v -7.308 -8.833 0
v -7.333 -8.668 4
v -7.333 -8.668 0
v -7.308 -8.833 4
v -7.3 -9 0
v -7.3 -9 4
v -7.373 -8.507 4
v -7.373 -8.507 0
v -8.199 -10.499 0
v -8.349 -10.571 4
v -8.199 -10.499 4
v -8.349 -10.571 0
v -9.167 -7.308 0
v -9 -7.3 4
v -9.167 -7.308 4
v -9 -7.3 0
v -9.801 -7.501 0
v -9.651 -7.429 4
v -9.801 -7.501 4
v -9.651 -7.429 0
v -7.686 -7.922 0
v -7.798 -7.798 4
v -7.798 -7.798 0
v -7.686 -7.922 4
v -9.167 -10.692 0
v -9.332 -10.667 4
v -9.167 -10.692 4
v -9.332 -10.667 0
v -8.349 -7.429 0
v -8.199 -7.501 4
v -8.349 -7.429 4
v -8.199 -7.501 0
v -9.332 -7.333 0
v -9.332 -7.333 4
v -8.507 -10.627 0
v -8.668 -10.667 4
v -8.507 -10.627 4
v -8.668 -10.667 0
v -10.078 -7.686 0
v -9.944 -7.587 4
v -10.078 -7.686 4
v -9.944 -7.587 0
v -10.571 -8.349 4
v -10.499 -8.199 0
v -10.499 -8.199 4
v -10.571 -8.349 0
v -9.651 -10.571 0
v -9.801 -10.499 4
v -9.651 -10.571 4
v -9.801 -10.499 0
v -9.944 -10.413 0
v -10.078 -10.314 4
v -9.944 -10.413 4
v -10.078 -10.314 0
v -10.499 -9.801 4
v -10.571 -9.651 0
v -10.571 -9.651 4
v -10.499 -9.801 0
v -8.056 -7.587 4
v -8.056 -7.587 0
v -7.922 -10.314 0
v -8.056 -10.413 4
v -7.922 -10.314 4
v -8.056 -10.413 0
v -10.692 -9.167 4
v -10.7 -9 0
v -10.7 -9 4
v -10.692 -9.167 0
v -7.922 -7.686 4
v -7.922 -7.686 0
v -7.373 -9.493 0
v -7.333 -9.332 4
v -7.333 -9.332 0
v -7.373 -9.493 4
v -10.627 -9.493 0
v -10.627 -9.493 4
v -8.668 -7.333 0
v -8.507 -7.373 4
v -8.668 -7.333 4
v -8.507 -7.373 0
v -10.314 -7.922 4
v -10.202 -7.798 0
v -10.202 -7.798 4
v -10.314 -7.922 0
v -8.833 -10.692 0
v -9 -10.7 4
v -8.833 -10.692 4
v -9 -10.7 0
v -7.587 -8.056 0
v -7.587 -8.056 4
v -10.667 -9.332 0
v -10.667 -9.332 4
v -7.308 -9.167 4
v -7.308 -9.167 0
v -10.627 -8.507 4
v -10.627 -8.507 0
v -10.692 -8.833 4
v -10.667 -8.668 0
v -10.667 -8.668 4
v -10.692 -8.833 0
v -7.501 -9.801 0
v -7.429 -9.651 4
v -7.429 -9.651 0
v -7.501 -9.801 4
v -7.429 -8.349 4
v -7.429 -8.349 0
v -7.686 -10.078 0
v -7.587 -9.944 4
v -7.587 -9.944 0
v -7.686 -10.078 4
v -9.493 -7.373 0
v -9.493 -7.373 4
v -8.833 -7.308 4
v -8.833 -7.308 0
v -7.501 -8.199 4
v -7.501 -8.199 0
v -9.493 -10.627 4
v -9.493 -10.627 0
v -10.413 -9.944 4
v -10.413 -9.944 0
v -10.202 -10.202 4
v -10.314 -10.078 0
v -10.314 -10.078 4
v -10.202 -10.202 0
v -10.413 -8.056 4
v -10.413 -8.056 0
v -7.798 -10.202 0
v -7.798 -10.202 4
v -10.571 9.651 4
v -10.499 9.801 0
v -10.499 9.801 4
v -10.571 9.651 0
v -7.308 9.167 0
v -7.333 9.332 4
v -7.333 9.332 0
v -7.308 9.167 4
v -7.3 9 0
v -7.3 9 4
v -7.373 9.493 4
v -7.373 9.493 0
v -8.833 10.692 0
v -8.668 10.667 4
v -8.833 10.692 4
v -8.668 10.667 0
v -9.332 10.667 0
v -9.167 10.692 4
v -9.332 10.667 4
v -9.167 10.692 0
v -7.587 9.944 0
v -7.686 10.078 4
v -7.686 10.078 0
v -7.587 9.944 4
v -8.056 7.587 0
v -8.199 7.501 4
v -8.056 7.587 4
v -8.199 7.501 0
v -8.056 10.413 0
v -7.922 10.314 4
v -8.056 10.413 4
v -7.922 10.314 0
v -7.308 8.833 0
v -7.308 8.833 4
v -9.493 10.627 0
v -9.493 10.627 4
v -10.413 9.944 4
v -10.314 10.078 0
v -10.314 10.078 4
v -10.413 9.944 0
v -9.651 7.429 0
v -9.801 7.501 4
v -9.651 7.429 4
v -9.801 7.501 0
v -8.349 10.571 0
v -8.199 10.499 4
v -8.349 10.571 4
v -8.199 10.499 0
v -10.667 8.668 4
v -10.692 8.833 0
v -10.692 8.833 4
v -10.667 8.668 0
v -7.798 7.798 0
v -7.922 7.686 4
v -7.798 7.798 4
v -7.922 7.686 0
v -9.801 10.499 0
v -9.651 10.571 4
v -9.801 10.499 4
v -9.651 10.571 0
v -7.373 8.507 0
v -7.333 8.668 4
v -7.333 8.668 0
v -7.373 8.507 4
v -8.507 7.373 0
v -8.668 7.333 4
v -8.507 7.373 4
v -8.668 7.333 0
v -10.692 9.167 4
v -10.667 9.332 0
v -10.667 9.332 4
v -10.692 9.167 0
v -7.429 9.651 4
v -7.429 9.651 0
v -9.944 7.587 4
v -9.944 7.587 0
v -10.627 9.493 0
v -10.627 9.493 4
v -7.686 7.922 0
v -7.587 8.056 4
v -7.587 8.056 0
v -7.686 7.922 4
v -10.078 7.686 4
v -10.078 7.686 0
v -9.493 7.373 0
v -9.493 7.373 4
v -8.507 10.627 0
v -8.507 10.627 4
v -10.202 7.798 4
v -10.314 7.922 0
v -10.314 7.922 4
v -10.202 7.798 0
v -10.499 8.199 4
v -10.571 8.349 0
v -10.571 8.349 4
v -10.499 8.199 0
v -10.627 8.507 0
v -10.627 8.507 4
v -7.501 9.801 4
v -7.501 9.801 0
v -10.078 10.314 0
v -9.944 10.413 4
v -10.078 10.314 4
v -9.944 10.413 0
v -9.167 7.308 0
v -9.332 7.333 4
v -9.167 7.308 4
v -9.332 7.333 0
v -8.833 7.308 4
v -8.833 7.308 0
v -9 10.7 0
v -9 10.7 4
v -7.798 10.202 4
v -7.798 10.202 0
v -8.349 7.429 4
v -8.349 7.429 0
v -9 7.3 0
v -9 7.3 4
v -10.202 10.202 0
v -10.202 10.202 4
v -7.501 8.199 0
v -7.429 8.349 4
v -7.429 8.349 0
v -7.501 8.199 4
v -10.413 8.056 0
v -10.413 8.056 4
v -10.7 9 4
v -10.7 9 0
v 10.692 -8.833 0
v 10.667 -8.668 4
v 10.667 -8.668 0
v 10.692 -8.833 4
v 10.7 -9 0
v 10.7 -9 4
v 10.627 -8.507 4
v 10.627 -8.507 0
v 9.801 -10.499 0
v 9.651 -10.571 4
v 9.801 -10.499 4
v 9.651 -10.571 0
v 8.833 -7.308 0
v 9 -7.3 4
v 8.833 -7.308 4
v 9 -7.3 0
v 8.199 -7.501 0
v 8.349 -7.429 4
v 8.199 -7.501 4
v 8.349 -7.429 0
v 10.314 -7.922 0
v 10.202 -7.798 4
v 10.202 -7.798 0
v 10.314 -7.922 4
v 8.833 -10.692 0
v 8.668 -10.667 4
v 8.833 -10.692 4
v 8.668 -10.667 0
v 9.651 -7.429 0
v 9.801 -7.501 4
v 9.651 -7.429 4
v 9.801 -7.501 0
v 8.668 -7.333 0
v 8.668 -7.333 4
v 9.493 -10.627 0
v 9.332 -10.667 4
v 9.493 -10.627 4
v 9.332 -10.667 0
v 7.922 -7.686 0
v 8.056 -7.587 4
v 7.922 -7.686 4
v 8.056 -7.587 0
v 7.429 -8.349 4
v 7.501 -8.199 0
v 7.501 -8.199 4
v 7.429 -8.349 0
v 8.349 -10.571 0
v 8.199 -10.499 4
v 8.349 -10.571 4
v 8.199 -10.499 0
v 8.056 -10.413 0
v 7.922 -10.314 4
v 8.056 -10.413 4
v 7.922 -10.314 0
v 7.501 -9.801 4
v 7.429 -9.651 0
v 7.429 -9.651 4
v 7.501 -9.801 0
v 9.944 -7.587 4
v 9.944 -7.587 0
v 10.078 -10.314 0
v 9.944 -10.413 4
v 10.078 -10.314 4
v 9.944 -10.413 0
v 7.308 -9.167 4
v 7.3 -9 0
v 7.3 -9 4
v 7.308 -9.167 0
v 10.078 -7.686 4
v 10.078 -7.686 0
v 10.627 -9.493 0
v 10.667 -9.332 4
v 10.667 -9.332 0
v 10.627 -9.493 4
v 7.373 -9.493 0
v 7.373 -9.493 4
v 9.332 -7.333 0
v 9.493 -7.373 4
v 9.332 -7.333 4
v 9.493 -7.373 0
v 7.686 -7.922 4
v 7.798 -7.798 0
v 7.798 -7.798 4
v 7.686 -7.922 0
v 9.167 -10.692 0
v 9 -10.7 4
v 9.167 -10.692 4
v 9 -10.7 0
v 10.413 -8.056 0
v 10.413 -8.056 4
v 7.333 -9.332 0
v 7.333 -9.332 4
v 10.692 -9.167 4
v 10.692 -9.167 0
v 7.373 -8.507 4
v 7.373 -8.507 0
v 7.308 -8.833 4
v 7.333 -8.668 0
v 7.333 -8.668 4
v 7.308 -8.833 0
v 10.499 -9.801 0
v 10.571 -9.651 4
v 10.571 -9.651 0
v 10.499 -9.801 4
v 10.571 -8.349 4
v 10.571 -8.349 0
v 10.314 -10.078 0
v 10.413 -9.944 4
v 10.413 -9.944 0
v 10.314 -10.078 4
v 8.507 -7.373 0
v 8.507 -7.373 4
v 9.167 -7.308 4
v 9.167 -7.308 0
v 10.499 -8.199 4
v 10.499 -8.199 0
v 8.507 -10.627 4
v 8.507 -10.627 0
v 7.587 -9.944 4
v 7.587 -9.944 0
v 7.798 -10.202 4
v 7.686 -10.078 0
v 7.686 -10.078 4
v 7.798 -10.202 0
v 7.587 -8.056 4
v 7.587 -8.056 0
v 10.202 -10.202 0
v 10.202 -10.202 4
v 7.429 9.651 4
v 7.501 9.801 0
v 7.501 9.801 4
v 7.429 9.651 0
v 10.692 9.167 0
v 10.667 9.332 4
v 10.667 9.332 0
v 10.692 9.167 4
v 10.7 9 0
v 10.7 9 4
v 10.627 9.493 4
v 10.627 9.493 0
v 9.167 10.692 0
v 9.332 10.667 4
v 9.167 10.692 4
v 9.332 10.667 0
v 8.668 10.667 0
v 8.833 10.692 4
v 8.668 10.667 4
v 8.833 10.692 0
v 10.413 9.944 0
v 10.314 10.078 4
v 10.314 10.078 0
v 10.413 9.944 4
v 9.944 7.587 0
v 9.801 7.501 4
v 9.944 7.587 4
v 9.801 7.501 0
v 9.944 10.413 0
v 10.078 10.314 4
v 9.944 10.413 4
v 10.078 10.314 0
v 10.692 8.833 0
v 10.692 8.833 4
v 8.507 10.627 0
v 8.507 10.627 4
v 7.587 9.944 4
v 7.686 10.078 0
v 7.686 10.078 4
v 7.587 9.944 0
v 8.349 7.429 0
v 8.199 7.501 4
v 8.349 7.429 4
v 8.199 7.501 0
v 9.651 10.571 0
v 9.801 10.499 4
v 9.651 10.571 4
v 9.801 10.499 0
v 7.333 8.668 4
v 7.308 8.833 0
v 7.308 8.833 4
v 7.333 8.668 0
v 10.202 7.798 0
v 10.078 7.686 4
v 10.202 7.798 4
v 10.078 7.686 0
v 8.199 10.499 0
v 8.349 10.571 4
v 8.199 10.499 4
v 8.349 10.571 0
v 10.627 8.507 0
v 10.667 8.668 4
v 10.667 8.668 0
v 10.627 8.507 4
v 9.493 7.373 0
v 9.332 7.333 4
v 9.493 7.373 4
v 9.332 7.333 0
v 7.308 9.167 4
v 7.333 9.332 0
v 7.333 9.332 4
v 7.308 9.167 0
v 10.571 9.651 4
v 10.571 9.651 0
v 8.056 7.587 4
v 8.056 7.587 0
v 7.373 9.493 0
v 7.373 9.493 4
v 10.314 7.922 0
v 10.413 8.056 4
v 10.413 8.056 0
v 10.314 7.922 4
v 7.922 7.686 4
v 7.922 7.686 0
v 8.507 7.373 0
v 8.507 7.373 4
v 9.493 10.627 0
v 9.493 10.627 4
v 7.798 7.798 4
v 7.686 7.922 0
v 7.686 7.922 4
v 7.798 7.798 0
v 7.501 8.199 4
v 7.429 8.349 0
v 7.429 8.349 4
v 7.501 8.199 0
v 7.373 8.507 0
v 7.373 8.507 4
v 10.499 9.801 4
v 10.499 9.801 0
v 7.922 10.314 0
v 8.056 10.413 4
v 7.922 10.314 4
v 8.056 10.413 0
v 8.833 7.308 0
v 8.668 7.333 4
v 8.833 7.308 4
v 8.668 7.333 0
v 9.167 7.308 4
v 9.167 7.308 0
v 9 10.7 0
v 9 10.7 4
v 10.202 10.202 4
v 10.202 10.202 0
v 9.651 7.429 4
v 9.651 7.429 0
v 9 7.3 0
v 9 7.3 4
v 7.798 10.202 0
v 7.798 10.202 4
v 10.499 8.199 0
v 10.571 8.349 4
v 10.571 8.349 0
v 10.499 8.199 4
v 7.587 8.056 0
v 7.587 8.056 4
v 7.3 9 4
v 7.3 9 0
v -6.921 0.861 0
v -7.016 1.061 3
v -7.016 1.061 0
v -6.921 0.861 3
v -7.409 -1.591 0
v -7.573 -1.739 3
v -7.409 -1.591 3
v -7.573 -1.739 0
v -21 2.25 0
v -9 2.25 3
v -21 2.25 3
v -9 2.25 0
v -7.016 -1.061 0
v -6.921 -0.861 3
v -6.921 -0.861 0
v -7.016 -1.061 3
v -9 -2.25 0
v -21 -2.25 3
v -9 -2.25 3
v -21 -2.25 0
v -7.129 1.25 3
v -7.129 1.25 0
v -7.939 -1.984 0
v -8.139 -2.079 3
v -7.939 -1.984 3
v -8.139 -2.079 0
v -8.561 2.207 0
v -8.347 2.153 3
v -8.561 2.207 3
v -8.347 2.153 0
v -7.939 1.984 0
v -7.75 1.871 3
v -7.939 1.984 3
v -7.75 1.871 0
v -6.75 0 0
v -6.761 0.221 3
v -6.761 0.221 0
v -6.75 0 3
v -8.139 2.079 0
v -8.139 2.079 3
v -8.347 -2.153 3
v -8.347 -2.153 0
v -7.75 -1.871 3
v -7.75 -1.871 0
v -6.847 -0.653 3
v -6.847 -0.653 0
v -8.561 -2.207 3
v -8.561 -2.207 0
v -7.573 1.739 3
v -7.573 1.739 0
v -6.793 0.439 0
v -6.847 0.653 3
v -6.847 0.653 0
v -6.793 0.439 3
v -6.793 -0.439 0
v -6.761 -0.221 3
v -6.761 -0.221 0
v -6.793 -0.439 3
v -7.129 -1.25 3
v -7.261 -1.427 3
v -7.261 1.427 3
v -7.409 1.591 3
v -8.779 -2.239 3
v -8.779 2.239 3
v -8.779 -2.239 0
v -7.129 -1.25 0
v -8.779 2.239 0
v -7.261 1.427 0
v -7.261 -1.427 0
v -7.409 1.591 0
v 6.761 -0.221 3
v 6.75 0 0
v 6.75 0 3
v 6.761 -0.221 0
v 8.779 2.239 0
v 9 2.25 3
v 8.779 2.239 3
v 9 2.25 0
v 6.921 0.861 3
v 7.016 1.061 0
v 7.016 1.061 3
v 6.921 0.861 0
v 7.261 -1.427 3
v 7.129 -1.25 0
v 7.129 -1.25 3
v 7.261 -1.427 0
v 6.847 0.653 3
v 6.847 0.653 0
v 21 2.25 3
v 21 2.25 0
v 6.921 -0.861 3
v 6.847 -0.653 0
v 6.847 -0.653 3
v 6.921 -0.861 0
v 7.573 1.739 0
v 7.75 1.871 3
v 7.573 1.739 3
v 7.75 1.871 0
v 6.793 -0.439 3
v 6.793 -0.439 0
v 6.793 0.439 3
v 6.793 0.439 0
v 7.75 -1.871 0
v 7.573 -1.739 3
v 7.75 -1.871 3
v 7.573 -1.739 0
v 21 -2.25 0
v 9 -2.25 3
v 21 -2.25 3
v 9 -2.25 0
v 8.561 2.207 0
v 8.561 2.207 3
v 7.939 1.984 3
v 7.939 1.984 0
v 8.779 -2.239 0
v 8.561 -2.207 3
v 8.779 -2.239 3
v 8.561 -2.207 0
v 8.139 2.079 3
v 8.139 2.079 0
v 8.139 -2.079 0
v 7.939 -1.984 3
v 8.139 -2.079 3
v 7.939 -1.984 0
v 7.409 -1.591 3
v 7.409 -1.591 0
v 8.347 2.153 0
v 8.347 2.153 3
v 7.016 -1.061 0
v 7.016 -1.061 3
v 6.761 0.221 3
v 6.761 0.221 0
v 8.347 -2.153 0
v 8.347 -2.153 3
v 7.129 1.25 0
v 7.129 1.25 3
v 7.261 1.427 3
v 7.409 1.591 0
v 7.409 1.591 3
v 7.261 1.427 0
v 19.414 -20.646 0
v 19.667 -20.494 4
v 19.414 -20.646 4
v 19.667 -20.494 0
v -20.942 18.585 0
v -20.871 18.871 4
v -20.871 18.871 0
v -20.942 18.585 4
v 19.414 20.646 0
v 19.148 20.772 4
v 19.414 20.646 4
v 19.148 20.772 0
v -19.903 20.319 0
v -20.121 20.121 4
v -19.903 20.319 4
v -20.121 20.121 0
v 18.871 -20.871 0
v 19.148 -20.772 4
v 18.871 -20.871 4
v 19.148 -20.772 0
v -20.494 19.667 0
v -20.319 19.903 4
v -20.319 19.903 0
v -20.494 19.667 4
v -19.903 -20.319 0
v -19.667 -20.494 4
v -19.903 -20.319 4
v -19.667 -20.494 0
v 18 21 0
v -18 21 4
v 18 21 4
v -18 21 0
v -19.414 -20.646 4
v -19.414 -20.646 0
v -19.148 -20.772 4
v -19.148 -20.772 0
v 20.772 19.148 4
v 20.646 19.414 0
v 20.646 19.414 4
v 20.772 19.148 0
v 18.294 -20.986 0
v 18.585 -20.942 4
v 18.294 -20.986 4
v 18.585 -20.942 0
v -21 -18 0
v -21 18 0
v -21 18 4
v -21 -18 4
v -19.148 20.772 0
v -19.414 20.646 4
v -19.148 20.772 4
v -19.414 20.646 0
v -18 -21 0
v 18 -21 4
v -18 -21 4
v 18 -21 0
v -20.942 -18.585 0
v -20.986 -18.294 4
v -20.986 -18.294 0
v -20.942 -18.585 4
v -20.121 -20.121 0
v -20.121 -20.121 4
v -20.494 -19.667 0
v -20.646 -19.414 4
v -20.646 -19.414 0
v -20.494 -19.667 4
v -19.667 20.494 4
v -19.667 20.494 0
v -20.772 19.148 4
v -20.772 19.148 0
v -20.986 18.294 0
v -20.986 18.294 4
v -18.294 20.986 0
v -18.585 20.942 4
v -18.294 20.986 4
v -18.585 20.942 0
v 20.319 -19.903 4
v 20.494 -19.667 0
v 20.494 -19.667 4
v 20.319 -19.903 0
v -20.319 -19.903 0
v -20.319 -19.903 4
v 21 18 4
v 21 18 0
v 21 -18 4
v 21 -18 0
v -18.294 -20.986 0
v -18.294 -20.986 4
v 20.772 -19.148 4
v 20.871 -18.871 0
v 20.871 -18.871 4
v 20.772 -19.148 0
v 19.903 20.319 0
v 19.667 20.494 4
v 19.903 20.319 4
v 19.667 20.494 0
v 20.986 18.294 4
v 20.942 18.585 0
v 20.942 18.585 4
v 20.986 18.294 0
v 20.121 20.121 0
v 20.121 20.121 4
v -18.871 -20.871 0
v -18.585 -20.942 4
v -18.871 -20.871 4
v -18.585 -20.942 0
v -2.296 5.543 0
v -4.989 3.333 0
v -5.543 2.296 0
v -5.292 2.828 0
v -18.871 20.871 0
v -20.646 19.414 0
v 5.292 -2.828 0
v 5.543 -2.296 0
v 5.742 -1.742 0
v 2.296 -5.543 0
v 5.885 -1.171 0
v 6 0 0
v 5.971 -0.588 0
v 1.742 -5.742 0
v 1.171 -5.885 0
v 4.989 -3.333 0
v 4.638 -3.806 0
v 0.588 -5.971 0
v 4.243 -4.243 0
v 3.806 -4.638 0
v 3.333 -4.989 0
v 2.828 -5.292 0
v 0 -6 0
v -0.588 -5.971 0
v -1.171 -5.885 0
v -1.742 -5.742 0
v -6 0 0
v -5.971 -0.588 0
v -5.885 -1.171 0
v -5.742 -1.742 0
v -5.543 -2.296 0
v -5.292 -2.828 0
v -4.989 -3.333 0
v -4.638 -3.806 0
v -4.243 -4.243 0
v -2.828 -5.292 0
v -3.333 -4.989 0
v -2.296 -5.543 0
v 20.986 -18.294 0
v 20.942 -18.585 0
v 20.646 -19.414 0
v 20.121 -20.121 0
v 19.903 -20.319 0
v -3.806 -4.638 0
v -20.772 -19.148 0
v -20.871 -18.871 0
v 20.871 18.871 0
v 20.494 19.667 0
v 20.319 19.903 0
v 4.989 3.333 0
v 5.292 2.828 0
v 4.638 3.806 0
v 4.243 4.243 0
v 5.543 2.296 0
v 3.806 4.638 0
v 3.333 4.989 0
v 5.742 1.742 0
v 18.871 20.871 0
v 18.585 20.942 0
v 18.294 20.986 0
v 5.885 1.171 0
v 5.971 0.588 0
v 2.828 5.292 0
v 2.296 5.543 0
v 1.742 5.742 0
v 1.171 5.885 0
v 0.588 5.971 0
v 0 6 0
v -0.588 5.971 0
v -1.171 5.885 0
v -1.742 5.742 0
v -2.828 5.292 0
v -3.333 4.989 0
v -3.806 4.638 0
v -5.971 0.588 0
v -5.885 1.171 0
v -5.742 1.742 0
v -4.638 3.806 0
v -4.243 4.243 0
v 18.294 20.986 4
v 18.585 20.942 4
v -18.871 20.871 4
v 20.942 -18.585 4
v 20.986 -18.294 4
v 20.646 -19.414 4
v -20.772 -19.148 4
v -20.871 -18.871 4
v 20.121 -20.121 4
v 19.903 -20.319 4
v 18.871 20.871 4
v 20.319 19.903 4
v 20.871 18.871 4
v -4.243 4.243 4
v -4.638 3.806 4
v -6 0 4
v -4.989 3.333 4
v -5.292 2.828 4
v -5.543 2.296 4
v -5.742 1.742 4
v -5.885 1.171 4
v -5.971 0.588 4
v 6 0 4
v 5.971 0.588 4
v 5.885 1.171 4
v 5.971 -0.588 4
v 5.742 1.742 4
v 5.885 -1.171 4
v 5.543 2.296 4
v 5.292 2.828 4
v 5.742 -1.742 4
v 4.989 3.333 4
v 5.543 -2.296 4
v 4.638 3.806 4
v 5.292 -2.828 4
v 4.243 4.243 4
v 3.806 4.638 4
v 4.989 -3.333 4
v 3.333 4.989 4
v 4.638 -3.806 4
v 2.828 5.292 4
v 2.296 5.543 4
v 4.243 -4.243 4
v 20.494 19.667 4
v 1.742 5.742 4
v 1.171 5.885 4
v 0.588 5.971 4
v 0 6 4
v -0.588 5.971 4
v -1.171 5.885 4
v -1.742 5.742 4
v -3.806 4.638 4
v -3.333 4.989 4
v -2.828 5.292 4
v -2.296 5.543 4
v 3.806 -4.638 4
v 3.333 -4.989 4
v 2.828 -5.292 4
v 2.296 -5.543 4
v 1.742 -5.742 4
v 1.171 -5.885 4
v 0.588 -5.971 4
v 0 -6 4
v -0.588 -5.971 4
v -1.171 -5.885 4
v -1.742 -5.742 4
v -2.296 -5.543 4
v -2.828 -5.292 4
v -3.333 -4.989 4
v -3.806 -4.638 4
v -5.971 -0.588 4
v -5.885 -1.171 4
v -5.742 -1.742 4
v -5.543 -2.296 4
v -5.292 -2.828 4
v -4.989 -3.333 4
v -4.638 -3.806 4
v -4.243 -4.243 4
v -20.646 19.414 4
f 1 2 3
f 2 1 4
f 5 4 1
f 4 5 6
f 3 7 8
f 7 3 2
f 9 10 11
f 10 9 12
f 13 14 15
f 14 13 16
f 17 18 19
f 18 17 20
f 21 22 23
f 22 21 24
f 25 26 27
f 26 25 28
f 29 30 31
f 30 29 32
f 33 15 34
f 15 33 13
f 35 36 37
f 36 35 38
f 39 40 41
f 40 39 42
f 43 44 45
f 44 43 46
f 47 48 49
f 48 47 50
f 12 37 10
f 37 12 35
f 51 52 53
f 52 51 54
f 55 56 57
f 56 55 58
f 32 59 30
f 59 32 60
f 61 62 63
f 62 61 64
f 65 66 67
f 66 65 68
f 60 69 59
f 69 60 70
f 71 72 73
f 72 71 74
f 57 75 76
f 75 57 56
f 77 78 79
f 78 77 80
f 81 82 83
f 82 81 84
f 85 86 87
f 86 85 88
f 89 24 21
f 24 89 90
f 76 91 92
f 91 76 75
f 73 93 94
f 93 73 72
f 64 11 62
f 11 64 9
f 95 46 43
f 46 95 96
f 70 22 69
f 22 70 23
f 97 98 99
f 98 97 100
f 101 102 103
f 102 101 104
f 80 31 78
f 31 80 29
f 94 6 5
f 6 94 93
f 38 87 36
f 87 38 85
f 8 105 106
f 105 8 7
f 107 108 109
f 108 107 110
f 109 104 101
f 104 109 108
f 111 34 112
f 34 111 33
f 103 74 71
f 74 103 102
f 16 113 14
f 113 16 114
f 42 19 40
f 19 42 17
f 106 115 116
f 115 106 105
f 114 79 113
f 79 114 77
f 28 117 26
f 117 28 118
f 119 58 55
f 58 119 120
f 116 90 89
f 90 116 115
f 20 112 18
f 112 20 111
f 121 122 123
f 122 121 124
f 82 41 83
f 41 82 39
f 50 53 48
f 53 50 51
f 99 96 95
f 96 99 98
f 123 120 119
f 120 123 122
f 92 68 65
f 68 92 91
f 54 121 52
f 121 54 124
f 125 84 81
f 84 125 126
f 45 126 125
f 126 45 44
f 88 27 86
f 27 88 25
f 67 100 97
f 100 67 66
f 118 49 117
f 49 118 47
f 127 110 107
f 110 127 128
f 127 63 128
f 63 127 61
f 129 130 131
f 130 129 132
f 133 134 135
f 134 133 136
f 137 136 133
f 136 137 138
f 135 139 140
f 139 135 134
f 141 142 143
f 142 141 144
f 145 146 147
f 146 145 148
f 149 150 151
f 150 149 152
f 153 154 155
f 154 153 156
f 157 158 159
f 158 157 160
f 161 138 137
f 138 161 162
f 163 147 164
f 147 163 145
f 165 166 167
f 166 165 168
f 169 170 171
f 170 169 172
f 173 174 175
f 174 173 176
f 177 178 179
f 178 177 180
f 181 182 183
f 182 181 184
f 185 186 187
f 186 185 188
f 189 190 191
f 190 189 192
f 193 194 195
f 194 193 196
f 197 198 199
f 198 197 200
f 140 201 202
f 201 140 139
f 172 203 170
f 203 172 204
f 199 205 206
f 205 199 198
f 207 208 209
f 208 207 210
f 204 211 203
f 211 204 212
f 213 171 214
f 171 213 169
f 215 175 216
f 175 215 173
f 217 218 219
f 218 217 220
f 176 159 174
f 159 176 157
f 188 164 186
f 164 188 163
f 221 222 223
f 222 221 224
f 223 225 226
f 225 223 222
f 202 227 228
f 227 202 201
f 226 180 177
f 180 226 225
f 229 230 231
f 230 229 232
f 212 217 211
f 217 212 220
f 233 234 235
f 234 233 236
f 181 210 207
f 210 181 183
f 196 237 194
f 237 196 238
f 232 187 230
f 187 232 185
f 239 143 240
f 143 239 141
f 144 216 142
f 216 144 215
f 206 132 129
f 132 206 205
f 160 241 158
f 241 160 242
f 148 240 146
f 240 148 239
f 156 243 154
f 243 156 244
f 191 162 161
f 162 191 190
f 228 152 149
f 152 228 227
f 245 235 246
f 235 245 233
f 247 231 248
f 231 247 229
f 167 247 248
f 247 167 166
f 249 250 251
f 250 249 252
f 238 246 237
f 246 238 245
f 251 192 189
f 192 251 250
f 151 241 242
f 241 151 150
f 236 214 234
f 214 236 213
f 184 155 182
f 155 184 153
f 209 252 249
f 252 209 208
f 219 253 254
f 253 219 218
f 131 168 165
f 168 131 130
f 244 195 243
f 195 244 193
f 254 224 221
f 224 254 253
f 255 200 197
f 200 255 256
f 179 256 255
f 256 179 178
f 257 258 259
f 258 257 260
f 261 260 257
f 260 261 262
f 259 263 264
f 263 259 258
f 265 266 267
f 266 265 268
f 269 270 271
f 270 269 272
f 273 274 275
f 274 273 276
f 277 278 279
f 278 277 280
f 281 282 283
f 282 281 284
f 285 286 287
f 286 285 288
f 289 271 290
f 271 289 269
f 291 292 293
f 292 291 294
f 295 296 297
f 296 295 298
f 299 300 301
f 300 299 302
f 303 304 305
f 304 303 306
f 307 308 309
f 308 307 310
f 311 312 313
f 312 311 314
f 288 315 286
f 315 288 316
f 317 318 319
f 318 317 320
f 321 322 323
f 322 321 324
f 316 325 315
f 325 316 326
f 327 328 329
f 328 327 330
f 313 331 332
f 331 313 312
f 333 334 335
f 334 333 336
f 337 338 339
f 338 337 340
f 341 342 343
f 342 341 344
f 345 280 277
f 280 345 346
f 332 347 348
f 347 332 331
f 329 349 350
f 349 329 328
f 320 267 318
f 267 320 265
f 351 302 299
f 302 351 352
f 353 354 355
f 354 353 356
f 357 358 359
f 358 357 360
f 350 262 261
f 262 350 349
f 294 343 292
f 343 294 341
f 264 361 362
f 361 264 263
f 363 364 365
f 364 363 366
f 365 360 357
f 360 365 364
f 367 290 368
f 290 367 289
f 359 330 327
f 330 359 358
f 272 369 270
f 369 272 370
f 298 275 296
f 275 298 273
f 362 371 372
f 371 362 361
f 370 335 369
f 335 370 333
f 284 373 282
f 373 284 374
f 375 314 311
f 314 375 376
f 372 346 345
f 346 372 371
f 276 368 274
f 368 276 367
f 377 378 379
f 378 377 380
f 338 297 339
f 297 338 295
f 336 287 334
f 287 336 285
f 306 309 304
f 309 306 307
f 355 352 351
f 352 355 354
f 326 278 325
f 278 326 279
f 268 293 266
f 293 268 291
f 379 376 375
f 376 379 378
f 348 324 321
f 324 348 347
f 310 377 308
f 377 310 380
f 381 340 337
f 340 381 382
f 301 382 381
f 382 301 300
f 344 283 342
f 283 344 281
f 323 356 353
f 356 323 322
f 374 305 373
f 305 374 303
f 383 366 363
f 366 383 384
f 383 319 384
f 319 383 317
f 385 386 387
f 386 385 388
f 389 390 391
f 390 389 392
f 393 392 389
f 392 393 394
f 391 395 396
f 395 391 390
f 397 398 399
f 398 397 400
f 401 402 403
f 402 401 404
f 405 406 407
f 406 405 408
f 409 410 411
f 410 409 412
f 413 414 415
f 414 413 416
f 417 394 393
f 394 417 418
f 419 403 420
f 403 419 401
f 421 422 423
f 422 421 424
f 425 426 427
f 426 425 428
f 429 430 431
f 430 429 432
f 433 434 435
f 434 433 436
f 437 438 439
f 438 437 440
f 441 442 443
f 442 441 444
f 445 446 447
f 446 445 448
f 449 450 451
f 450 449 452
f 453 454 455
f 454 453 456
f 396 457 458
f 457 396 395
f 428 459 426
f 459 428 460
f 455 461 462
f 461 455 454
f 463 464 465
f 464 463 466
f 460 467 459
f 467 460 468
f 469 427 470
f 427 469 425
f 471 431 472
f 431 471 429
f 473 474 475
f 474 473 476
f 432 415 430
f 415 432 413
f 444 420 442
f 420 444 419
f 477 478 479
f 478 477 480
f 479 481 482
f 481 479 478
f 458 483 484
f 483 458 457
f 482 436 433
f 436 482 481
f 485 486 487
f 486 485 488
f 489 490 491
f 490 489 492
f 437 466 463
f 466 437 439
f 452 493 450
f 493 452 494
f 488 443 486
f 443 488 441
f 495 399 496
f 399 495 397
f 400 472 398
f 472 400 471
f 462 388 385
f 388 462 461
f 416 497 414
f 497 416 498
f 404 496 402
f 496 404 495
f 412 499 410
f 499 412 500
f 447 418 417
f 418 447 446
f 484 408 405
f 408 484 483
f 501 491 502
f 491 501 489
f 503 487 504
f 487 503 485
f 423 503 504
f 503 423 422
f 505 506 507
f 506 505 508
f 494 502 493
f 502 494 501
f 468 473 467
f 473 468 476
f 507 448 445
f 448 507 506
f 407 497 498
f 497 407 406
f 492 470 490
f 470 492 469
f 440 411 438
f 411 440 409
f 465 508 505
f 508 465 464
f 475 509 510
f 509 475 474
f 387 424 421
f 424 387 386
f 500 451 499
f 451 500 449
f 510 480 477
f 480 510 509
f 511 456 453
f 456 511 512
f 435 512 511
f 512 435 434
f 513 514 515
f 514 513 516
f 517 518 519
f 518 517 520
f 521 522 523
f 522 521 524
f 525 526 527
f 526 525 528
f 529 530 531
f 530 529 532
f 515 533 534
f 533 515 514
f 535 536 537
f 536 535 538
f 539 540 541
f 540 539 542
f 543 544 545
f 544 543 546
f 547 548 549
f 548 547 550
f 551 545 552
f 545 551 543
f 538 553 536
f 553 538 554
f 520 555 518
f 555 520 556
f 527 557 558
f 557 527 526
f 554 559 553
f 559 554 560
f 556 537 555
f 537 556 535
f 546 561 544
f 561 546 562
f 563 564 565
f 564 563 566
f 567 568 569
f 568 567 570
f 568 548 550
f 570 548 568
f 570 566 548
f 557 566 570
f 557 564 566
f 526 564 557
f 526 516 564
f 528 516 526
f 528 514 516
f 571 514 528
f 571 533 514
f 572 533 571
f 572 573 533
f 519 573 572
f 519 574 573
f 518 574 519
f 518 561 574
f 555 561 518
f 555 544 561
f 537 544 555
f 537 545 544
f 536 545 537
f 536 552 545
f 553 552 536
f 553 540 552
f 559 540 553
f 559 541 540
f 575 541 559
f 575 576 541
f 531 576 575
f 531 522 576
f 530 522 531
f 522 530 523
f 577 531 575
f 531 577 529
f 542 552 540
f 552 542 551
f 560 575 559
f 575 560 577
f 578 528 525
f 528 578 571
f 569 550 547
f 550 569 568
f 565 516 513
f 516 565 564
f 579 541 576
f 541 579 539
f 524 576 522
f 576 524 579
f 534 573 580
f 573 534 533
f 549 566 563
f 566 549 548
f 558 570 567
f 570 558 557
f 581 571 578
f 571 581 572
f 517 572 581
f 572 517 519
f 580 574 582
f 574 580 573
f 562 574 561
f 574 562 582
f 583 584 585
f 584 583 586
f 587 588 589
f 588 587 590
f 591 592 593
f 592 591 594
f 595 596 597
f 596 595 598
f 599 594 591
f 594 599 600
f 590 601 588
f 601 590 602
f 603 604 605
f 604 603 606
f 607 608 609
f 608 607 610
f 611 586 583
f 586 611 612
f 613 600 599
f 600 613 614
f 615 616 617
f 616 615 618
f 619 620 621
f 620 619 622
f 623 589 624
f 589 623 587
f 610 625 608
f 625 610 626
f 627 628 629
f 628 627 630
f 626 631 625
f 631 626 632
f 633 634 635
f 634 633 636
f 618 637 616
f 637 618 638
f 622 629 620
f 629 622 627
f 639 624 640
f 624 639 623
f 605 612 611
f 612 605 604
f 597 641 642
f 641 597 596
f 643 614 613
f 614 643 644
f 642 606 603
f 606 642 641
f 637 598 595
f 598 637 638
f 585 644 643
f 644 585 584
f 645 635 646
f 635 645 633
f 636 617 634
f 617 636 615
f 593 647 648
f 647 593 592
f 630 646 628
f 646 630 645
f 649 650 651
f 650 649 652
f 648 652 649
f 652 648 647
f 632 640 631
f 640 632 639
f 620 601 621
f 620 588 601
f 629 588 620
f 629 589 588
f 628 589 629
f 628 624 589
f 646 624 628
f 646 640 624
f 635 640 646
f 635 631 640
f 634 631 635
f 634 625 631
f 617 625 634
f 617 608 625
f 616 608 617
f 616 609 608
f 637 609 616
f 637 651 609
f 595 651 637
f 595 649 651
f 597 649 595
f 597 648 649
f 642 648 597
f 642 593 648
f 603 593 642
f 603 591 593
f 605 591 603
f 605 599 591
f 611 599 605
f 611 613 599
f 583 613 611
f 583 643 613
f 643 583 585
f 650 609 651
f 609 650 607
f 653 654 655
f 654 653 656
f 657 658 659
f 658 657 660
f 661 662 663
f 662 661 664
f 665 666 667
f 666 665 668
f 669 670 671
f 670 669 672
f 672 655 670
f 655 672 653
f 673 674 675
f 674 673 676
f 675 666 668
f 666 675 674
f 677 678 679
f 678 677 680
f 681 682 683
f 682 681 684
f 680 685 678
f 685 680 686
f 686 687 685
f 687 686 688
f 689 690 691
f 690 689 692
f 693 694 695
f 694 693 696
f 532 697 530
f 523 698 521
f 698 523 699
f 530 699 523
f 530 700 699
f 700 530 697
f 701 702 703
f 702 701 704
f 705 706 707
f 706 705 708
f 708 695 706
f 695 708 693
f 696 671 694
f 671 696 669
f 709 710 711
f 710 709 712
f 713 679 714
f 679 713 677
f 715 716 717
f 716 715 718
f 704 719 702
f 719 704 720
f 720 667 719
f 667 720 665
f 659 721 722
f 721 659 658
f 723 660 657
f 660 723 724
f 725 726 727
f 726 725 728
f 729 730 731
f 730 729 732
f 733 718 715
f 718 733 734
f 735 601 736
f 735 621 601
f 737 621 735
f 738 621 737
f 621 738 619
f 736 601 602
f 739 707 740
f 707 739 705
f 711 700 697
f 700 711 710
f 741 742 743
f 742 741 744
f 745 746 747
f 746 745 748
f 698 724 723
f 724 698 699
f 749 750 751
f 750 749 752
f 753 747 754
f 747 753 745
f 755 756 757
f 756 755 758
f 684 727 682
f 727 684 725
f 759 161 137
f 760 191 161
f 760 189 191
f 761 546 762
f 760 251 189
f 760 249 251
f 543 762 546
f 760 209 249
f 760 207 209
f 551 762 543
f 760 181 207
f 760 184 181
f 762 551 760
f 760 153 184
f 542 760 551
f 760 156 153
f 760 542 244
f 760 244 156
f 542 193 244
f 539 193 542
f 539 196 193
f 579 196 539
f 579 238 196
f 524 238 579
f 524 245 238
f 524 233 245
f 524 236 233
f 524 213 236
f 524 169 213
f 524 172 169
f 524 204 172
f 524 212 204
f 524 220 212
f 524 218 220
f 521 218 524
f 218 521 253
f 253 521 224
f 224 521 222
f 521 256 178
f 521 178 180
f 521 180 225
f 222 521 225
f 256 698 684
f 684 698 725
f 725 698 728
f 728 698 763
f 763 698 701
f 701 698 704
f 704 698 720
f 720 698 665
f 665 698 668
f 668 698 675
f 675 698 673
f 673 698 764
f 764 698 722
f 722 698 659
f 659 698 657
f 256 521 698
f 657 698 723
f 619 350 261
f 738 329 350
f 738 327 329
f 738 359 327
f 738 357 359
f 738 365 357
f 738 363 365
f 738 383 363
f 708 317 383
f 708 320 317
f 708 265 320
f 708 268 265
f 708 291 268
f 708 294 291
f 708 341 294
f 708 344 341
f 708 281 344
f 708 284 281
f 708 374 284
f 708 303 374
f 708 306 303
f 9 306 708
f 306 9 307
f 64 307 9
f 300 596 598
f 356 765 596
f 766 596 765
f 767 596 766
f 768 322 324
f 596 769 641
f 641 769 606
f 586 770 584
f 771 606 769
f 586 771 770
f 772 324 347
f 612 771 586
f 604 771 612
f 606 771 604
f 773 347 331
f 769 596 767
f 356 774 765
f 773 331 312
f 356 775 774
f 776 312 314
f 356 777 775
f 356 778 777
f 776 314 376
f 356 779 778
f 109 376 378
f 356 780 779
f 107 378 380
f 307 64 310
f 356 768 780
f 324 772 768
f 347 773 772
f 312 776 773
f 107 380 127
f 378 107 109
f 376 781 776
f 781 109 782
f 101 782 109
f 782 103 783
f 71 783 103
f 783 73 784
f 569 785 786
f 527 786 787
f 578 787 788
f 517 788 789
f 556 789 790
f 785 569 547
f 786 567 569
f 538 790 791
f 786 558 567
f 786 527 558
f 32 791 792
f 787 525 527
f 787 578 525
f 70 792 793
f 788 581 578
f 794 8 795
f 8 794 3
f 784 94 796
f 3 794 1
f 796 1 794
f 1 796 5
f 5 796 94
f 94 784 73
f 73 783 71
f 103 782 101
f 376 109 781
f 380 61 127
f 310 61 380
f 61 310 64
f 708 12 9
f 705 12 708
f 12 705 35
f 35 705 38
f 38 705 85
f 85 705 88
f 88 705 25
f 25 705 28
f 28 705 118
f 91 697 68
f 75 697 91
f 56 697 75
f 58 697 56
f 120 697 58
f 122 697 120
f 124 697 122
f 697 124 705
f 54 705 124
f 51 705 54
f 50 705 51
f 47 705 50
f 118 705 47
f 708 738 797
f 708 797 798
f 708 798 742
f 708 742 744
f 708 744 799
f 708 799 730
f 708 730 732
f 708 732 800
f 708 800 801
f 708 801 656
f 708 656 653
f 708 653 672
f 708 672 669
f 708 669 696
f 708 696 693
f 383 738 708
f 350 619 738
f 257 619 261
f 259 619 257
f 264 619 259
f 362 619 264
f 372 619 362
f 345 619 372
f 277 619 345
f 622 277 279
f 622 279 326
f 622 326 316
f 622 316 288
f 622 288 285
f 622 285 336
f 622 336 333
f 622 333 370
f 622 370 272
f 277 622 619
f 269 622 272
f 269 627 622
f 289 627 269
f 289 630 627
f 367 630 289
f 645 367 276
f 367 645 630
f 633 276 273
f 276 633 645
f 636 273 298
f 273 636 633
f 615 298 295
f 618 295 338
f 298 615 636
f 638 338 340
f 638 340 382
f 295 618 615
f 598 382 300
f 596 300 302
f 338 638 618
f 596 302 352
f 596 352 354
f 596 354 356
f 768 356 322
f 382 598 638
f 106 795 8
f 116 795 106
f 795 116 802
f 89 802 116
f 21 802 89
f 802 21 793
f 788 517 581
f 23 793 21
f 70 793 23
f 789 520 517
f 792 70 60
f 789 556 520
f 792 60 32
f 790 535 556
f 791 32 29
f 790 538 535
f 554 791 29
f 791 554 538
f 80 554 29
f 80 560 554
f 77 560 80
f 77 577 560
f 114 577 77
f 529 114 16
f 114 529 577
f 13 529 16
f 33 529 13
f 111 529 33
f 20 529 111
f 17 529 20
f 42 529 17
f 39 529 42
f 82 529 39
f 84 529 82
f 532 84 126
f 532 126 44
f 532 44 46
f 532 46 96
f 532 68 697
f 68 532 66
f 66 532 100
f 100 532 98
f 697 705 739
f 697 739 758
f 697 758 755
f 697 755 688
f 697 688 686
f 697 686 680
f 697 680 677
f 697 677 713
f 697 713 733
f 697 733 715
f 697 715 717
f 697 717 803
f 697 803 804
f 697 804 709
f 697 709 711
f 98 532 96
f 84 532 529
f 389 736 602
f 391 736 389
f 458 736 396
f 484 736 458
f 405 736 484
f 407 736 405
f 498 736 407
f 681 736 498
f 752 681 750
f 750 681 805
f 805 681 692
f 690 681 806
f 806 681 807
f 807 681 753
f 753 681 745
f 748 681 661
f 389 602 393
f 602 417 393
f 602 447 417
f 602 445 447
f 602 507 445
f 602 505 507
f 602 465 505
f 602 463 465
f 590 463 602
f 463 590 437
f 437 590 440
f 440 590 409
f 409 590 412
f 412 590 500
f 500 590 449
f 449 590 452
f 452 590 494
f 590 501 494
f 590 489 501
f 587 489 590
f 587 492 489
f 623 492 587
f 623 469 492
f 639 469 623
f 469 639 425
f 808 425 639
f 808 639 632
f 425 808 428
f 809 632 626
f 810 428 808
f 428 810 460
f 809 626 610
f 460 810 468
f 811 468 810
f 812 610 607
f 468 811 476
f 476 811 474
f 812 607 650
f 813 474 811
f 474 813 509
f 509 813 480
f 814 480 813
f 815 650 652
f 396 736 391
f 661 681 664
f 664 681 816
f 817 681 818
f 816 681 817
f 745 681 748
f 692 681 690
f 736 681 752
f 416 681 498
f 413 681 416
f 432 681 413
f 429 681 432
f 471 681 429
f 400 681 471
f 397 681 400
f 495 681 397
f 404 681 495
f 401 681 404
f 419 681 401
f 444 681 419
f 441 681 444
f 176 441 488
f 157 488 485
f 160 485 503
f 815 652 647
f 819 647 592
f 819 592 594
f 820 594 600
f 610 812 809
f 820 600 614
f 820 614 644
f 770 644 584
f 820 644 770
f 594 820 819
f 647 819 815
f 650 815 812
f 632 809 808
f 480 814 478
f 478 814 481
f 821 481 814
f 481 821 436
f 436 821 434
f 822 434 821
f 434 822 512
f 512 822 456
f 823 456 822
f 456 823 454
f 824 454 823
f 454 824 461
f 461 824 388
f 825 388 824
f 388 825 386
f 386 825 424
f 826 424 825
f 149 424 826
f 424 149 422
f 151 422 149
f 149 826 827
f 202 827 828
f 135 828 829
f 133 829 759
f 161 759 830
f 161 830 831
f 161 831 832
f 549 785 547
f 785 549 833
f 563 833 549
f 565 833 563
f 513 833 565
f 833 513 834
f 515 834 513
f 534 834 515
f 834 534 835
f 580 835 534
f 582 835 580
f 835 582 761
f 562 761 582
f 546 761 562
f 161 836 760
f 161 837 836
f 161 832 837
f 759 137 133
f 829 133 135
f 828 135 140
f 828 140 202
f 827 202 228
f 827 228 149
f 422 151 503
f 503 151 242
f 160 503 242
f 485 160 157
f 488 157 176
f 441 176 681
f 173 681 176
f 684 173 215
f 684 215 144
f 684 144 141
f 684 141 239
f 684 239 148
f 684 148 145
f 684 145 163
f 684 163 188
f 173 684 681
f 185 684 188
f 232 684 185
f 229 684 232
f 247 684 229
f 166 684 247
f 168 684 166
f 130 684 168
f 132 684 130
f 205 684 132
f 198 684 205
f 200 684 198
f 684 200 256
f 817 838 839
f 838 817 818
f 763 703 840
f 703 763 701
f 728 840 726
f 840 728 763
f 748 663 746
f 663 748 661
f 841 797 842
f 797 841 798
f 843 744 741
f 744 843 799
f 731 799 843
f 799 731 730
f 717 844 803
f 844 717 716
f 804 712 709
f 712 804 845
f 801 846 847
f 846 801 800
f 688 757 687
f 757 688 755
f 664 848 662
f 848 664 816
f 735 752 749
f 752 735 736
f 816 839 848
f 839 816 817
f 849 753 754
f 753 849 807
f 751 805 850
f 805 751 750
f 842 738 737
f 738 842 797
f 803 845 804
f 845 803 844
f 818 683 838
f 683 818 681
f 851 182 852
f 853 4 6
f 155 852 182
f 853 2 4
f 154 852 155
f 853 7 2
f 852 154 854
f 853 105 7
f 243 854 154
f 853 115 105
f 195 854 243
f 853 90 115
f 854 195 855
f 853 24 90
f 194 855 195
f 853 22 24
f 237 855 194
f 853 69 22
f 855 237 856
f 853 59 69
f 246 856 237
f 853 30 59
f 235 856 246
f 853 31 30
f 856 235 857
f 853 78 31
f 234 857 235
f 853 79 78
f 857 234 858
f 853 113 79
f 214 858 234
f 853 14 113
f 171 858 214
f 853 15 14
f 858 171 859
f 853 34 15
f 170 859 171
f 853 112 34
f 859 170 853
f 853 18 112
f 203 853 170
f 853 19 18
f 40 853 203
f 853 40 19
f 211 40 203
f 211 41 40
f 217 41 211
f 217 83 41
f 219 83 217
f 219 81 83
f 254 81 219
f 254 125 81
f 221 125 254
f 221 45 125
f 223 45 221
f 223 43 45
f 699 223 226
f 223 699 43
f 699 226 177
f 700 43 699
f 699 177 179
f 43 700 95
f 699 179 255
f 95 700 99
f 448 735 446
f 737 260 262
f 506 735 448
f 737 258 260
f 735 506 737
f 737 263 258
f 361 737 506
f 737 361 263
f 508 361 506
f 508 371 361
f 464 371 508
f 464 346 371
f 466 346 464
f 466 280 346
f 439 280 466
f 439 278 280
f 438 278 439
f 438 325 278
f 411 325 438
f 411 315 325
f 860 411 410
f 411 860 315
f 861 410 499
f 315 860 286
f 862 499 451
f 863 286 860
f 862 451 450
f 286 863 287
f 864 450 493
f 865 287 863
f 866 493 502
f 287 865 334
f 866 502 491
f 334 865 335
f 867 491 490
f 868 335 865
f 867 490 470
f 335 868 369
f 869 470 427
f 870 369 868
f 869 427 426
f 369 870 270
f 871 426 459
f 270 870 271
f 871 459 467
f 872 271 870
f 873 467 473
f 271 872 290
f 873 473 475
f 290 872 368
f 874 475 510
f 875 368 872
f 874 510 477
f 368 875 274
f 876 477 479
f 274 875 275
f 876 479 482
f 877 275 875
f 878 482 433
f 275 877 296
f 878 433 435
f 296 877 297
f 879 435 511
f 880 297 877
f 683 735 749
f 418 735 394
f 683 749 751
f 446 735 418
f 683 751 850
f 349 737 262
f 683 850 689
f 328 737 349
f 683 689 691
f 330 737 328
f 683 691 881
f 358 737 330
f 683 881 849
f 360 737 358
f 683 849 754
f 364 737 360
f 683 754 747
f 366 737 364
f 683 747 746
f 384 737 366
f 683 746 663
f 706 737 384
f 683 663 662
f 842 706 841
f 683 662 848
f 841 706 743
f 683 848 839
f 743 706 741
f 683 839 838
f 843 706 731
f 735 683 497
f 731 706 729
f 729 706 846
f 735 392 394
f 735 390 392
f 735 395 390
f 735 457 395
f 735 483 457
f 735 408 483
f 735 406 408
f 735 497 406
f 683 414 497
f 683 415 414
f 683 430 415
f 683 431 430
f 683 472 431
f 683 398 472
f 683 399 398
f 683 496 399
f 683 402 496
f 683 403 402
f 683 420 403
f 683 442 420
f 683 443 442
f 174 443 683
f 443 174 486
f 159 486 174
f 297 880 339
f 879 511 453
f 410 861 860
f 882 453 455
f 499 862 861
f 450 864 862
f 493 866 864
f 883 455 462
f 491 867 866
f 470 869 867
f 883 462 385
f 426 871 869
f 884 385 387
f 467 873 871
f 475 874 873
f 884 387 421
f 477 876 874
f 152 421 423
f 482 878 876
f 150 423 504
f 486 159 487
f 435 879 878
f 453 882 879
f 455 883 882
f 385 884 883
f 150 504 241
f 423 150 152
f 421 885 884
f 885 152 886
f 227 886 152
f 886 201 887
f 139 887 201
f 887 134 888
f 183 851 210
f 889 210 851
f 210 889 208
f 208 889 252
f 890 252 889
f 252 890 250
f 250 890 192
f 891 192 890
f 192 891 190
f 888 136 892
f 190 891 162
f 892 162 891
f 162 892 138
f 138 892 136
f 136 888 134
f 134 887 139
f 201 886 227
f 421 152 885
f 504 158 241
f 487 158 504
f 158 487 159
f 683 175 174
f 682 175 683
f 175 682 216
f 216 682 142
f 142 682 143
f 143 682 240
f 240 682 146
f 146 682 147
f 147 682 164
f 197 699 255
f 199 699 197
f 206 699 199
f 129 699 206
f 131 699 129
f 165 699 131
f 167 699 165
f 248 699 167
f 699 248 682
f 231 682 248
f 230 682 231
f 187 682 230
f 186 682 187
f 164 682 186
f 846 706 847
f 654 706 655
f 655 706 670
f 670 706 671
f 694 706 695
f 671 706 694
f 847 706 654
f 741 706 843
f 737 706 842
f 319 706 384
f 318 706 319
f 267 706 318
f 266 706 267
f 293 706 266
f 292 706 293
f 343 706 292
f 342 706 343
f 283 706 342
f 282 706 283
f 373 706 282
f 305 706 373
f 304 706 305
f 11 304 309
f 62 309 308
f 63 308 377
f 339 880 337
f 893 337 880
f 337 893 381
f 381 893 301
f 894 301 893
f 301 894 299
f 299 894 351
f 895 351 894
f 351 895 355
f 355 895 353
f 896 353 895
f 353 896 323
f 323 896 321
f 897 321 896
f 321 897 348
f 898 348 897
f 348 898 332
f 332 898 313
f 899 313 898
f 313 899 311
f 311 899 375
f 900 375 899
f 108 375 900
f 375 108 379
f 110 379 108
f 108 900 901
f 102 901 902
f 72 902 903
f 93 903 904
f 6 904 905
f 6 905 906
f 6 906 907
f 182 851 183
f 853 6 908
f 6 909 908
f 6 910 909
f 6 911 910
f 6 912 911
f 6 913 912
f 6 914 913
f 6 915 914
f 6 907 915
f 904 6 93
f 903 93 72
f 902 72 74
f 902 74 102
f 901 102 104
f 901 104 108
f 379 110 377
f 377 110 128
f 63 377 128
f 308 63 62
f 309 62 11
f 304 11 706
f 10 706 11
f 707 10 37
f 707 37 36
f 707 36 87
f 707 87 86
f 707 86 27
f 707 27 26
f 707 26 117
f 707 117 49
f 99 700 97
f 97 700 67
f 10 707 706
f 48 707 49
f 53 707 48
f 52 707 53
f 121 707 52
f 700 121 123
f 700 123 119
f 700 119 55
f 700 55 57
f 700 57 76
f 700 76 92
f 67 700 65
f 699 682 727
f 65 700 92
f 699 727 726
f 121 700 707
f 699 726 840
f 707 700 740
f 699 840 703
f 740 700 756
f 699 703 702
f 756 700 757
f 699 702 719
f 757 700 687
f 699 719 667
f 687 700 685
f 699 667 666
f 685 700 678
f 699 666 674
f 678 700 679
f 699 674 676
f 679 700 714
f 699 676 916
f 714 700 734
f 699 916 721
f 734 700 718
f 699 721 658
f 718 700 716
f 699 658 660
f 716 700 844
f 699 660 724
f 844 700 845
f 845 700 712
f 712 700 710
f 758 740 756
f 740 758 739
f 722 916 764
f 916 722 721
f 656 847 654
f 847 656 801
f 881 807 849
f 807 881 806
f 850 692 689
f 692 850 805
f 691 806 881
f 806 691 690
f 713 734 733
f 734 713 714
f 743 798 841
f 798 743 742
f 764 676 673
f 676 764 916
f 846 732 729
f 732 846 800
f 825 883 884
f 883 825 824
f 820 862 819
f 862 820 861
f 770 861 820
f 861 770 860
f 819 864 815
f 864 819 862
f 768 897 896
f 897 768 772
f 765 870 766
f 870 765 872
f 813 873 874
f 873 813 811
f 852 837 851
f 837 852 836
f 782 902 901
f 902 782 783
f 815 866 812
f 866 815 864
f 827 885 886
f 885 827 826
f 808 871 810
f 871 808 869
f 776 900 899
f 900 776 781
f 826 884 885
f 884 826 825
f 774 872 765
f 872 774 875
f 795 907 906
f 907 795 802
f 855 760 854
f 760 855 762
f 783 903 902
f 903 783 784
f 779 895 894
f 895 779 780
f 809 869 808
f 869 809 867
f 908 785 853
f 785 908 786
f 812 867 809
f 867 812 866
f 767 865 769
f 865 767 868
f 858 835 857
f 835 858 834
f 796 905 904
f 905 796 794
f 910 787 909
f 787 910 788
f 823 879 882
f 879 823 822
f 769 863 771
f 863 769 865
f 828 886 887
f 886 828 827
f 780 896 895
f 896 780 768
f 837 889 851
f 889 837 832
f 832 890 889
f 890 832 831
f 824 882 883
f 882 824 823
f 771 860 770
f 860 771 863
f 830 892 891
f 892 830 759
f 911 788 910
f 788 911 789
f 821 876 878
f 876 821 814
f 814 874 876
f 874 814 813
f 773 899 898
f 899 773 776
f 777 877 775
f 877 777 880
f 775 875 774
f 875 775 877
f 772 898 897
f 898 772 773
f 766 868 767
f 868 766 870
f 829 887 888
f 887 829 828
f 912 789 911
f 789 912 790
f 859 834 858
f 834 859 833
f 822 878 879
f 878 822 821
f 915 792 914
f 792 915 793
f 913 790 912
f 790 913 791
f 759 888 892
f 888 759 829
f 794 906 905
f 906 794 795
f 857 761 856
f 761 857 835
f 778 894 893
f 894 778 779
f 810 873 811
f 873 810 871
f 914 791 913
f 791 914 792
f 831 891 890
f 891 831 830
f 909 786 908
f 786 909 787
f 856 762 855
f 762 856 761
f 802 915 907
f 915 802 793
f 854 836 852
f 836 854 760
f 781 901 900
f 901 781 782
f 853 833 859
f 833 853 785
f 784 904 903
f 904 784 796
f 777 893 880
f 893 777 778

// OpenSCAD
// file: ../../common.scad
$fn=64;
module rounded_box2d(x,y,r=4){ offset(r=r) offset(delta=-r) square([x,y],center=true); }
module plate(x,y,h,r=4){ linear_extrude(h) rounded_box2d(x,y,r); }
module slot3d(len,d,h){ hull(){translate([-len/2,0,0])cylinder(h=h,d=d,center=true);translate([len/2,0,0])cylinder(h=h,d=d,center=true);} }
// main file
include <../../common.scad>
px=42;py=42;ph=4;m3=3.4;m4=4.5;
difference(){plate(px,py,ph,3);cylinder(h=20,d=12,center=true);for(x=[-9,9])for(y=[-9,9])translate([x,y,-1])cylinder(h=ph+2,d=m3);for(x=[-15,15])translate([x,0,0])slot3d(12,m4,ph+2);}
